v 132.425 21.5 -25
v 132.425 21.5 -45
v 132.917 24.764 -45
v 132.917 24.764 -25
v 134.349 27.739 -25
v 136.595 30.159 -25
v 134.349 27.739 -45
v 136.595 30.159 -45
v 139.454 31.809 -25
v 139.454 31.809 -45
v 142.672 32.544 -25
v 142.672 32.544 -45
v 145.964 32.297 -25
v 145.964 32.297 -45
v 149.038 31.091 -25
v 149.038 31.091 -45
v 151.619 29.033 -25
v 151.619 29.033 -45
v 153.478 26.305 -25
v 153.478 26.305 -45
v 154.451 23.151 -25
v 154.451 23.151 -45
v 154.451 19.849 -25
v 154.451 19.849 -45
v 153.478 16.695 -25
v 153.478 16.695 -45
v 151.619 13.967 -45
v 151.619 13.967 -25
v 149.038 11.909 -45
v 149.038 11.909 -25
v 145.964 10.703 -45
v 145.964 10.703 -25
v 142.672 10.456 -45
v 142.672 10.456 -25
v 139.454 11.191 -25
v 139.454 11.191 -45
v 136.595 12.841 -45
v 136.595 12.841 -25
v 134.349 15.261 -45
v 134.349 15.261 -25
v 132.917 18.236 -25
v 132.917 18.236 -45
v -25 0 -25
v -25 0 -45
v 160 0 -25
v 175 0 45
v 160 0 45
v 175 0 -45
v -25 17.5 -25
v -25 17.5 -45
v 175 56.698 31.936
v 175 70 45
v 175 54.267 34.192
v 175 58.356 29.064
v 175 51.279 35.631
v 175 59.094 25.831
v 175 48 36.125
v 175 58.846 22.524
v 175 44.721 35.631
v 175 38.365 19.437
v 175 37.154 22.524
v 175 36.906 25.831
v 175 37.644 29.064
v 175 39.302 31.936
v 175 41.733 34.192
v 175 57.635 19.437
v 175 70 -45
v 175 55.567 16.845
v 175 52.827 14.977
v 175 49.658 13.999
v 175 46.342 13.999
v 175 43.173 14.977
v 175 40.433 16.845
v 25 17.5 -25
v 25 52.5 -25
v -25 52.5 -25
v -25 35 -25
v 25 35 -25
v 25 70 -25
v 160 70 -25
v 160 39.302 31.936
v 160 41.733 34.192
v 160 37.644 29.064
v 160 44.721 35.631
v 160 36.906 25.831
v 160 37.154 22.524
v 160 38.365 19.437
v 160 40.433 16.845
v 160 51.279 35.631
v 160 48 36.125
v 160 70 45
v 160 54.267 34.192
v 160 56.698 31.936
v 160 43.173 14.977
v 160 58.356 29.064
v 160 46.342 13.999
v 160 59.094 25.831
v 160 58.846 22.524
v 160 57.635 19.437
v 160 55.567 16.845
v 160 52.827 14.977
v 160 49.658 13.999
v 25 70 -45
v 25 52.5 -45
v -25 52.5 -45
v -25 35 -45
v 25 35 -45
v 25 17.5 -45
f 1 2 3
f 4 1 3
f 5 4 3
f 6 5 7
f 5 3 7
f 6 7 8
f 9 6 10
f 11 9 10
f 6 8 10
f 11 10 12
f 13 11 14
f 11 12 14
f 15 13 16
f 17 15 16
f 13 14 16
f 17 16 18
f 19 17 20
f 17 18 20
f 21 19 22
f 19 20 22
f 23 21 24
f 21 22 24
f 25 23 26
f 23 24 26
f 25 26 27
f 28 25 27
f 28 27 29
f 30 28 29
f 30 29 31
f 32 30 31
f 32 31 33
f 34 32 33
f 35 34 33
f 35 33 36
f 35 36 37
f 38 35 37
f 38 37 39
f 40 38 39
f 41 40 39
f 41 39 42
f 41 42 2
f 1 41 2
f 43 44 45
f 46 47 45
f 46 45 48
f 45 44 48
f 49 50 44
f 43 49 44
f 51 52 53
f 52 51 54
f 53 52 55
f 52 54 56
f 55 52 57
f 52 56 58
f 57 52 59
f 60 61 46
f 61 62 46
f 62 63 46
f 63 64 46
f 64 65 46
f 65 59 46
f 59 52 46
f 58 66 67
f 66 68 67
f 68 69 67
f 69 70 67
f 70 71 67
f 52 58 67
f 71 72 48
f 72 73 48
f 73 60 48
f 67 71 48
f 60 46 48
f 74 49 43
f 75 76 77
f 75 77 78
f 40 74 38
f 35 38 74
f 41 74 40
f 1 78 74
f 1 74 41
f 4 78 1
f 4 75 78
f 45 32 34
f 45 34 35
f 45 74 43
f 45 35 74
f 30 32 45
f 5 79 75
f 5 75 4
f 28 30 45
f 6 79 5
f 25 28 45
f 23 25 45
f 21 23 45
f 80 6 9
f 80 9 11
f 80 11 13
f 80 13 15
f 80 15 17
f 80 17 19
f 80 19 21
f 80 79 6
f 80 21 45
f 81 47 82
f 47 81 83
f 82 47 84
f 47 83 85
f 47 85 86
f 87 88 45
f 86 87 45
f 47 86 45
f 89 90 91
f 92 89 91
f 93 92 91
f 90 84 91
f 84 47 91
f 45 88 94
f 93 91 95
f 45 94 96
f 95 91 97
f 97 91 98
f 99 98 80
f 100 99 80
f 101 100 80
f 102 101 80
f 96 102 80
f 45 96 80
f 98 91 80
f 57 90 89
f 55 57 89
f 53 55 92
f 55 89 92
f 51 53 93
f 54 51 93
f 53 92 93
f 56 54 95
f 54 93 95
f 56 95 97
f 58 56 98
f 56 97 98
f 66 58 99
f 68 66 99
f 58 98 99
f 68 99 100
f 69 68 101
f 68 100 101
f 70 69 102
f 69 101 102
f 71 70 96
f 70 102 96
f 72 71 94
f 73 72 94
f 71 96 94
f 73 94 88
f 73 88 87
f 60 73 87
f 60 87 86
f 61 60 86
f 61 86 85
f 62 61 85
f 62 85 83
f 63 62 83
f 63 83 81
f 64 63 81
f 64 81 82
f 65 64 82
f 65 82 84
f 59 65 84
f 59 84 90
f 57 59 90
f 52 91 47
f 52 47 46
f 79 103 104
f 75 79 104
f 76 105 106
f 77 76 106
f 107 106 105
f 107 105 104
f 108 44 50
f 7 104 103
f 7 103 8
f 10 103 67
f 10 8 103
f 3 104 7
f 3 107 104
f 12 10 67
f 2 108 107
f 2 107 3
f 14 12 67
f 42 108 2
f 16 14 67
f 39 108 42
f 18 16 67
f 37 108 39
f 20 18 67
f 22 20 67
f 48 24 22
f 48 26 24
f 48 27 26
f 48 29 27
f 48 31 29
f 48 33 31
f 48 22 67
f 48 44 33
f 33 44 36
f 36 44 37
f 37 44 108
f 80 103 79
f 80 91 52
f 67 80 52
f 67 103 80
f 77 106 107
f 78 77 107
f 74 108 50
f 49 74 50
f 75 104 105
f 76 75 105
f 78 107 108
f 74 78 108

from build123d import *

# Parameters (mm, degrees)
CROQUIS1_W              = 350
CROQUIS1_H              = 90
SALIENTE_EXTRUIR1_DEPTH = 70
CROQUIS2_W              = 320
CROQUIS2_H              = 70
CORTAR_EXTRUIR1_DEPTH   = 194.778223751
CROQUIS3_R              = 11.125
CORTAR_EXTRUIR2_DEPTH   = 360.756862339
CROQUIS8_R              = 11.075
CORTAR_EXTRUIR3_DEPTH   = 209.865985742
CROQUIS9_R              = 11.075
CORTAR_EXTRUIR5_DEPTH   = 209.865985742


with BuildPart() as part:
    # Croquis1 → Saliente-Extruir1 (new body)
    with BuildSketch(Plane(origin=(0, 0, 0), x_dir=(1, 0, 0), z_dir=(0, 1, 0))):
        Rectangle(CROQUIS1_W, CROQUIS1_H)
    extrude(amount=SALIENTE_EXTRUIR1_DEPTH)

    # Croquis2 → Cortar-Extruir1 (cut, through all)
    with BuildSketch(Plane(origin=(0, 70, 0), x_dir=(1, 0, 0), z_dir=(0, 1, 0))):
        with Locations((0, -10)):
            Rectangle(CROQUIS2_W, CROQUIS2_H)
    extrude(amount=-CORTAR_EXTRUIR1_DEPTH, mode=Mode.SUBTRACT)

    # Croquis3 → Cortar-Extruir2 (cut, through all)
    with BuildSketch(Plane.ZY.offset(175)):
        with Locations((25, 48)):
            Circle(CROQUIS3_R)
    extrude(amount=-CORTAR_EXTRUIR2_DEPTH, mode=Mode.SUBTRACT)

    # Croquis8 → Cortar-Extruir3 (cut, through all)
    with BuildSketch(Plane(origin=(0, 0, -45), x_dir=(-1, 0, 0), z_dir=(0, 0, -1))):
        with Locations((-143.5, 21.5)):
            Circle(CROQUIS8_R)
    cortar_extruir3 = extrude(amount=-CORTAR_EXTRUIR3_DEPTH, mode=Mode.SUBTRACT)

    # Simetría1: Cortar-Extruir3 across plane
    add(cortar_extruir3.mirror(Plane(origin=(0, 0, 0), x_dir=(0, 0, 1), z_dir=(1, 0, 0))), mode=Mode.SUBTRACT)

    # Croquis9 → Cortar-Extruir5 (cut, through all)
    with BuildSketch(Plane(origin=(0, 0, -45), x_dir=(-1, 0, 0), z_dir=(0, 0, -1))):
        Polygon((-25, 35), (-25, 17.5), (25, 17.5), (25, 0), (175, 0), (175, 70), (-25, 70), (-25, 52.5), (25, 52.5), (25, 35), align=None)
        with Locations((143.5, 21.5)):
            Circle(CROQUIS9_R, mode=Mode.SUBTRACT)
    extrude(amount=-CORTAR_EXTRUIR5_DEPTH, mode=Mode.SUBTRACT)


solid = part.part
